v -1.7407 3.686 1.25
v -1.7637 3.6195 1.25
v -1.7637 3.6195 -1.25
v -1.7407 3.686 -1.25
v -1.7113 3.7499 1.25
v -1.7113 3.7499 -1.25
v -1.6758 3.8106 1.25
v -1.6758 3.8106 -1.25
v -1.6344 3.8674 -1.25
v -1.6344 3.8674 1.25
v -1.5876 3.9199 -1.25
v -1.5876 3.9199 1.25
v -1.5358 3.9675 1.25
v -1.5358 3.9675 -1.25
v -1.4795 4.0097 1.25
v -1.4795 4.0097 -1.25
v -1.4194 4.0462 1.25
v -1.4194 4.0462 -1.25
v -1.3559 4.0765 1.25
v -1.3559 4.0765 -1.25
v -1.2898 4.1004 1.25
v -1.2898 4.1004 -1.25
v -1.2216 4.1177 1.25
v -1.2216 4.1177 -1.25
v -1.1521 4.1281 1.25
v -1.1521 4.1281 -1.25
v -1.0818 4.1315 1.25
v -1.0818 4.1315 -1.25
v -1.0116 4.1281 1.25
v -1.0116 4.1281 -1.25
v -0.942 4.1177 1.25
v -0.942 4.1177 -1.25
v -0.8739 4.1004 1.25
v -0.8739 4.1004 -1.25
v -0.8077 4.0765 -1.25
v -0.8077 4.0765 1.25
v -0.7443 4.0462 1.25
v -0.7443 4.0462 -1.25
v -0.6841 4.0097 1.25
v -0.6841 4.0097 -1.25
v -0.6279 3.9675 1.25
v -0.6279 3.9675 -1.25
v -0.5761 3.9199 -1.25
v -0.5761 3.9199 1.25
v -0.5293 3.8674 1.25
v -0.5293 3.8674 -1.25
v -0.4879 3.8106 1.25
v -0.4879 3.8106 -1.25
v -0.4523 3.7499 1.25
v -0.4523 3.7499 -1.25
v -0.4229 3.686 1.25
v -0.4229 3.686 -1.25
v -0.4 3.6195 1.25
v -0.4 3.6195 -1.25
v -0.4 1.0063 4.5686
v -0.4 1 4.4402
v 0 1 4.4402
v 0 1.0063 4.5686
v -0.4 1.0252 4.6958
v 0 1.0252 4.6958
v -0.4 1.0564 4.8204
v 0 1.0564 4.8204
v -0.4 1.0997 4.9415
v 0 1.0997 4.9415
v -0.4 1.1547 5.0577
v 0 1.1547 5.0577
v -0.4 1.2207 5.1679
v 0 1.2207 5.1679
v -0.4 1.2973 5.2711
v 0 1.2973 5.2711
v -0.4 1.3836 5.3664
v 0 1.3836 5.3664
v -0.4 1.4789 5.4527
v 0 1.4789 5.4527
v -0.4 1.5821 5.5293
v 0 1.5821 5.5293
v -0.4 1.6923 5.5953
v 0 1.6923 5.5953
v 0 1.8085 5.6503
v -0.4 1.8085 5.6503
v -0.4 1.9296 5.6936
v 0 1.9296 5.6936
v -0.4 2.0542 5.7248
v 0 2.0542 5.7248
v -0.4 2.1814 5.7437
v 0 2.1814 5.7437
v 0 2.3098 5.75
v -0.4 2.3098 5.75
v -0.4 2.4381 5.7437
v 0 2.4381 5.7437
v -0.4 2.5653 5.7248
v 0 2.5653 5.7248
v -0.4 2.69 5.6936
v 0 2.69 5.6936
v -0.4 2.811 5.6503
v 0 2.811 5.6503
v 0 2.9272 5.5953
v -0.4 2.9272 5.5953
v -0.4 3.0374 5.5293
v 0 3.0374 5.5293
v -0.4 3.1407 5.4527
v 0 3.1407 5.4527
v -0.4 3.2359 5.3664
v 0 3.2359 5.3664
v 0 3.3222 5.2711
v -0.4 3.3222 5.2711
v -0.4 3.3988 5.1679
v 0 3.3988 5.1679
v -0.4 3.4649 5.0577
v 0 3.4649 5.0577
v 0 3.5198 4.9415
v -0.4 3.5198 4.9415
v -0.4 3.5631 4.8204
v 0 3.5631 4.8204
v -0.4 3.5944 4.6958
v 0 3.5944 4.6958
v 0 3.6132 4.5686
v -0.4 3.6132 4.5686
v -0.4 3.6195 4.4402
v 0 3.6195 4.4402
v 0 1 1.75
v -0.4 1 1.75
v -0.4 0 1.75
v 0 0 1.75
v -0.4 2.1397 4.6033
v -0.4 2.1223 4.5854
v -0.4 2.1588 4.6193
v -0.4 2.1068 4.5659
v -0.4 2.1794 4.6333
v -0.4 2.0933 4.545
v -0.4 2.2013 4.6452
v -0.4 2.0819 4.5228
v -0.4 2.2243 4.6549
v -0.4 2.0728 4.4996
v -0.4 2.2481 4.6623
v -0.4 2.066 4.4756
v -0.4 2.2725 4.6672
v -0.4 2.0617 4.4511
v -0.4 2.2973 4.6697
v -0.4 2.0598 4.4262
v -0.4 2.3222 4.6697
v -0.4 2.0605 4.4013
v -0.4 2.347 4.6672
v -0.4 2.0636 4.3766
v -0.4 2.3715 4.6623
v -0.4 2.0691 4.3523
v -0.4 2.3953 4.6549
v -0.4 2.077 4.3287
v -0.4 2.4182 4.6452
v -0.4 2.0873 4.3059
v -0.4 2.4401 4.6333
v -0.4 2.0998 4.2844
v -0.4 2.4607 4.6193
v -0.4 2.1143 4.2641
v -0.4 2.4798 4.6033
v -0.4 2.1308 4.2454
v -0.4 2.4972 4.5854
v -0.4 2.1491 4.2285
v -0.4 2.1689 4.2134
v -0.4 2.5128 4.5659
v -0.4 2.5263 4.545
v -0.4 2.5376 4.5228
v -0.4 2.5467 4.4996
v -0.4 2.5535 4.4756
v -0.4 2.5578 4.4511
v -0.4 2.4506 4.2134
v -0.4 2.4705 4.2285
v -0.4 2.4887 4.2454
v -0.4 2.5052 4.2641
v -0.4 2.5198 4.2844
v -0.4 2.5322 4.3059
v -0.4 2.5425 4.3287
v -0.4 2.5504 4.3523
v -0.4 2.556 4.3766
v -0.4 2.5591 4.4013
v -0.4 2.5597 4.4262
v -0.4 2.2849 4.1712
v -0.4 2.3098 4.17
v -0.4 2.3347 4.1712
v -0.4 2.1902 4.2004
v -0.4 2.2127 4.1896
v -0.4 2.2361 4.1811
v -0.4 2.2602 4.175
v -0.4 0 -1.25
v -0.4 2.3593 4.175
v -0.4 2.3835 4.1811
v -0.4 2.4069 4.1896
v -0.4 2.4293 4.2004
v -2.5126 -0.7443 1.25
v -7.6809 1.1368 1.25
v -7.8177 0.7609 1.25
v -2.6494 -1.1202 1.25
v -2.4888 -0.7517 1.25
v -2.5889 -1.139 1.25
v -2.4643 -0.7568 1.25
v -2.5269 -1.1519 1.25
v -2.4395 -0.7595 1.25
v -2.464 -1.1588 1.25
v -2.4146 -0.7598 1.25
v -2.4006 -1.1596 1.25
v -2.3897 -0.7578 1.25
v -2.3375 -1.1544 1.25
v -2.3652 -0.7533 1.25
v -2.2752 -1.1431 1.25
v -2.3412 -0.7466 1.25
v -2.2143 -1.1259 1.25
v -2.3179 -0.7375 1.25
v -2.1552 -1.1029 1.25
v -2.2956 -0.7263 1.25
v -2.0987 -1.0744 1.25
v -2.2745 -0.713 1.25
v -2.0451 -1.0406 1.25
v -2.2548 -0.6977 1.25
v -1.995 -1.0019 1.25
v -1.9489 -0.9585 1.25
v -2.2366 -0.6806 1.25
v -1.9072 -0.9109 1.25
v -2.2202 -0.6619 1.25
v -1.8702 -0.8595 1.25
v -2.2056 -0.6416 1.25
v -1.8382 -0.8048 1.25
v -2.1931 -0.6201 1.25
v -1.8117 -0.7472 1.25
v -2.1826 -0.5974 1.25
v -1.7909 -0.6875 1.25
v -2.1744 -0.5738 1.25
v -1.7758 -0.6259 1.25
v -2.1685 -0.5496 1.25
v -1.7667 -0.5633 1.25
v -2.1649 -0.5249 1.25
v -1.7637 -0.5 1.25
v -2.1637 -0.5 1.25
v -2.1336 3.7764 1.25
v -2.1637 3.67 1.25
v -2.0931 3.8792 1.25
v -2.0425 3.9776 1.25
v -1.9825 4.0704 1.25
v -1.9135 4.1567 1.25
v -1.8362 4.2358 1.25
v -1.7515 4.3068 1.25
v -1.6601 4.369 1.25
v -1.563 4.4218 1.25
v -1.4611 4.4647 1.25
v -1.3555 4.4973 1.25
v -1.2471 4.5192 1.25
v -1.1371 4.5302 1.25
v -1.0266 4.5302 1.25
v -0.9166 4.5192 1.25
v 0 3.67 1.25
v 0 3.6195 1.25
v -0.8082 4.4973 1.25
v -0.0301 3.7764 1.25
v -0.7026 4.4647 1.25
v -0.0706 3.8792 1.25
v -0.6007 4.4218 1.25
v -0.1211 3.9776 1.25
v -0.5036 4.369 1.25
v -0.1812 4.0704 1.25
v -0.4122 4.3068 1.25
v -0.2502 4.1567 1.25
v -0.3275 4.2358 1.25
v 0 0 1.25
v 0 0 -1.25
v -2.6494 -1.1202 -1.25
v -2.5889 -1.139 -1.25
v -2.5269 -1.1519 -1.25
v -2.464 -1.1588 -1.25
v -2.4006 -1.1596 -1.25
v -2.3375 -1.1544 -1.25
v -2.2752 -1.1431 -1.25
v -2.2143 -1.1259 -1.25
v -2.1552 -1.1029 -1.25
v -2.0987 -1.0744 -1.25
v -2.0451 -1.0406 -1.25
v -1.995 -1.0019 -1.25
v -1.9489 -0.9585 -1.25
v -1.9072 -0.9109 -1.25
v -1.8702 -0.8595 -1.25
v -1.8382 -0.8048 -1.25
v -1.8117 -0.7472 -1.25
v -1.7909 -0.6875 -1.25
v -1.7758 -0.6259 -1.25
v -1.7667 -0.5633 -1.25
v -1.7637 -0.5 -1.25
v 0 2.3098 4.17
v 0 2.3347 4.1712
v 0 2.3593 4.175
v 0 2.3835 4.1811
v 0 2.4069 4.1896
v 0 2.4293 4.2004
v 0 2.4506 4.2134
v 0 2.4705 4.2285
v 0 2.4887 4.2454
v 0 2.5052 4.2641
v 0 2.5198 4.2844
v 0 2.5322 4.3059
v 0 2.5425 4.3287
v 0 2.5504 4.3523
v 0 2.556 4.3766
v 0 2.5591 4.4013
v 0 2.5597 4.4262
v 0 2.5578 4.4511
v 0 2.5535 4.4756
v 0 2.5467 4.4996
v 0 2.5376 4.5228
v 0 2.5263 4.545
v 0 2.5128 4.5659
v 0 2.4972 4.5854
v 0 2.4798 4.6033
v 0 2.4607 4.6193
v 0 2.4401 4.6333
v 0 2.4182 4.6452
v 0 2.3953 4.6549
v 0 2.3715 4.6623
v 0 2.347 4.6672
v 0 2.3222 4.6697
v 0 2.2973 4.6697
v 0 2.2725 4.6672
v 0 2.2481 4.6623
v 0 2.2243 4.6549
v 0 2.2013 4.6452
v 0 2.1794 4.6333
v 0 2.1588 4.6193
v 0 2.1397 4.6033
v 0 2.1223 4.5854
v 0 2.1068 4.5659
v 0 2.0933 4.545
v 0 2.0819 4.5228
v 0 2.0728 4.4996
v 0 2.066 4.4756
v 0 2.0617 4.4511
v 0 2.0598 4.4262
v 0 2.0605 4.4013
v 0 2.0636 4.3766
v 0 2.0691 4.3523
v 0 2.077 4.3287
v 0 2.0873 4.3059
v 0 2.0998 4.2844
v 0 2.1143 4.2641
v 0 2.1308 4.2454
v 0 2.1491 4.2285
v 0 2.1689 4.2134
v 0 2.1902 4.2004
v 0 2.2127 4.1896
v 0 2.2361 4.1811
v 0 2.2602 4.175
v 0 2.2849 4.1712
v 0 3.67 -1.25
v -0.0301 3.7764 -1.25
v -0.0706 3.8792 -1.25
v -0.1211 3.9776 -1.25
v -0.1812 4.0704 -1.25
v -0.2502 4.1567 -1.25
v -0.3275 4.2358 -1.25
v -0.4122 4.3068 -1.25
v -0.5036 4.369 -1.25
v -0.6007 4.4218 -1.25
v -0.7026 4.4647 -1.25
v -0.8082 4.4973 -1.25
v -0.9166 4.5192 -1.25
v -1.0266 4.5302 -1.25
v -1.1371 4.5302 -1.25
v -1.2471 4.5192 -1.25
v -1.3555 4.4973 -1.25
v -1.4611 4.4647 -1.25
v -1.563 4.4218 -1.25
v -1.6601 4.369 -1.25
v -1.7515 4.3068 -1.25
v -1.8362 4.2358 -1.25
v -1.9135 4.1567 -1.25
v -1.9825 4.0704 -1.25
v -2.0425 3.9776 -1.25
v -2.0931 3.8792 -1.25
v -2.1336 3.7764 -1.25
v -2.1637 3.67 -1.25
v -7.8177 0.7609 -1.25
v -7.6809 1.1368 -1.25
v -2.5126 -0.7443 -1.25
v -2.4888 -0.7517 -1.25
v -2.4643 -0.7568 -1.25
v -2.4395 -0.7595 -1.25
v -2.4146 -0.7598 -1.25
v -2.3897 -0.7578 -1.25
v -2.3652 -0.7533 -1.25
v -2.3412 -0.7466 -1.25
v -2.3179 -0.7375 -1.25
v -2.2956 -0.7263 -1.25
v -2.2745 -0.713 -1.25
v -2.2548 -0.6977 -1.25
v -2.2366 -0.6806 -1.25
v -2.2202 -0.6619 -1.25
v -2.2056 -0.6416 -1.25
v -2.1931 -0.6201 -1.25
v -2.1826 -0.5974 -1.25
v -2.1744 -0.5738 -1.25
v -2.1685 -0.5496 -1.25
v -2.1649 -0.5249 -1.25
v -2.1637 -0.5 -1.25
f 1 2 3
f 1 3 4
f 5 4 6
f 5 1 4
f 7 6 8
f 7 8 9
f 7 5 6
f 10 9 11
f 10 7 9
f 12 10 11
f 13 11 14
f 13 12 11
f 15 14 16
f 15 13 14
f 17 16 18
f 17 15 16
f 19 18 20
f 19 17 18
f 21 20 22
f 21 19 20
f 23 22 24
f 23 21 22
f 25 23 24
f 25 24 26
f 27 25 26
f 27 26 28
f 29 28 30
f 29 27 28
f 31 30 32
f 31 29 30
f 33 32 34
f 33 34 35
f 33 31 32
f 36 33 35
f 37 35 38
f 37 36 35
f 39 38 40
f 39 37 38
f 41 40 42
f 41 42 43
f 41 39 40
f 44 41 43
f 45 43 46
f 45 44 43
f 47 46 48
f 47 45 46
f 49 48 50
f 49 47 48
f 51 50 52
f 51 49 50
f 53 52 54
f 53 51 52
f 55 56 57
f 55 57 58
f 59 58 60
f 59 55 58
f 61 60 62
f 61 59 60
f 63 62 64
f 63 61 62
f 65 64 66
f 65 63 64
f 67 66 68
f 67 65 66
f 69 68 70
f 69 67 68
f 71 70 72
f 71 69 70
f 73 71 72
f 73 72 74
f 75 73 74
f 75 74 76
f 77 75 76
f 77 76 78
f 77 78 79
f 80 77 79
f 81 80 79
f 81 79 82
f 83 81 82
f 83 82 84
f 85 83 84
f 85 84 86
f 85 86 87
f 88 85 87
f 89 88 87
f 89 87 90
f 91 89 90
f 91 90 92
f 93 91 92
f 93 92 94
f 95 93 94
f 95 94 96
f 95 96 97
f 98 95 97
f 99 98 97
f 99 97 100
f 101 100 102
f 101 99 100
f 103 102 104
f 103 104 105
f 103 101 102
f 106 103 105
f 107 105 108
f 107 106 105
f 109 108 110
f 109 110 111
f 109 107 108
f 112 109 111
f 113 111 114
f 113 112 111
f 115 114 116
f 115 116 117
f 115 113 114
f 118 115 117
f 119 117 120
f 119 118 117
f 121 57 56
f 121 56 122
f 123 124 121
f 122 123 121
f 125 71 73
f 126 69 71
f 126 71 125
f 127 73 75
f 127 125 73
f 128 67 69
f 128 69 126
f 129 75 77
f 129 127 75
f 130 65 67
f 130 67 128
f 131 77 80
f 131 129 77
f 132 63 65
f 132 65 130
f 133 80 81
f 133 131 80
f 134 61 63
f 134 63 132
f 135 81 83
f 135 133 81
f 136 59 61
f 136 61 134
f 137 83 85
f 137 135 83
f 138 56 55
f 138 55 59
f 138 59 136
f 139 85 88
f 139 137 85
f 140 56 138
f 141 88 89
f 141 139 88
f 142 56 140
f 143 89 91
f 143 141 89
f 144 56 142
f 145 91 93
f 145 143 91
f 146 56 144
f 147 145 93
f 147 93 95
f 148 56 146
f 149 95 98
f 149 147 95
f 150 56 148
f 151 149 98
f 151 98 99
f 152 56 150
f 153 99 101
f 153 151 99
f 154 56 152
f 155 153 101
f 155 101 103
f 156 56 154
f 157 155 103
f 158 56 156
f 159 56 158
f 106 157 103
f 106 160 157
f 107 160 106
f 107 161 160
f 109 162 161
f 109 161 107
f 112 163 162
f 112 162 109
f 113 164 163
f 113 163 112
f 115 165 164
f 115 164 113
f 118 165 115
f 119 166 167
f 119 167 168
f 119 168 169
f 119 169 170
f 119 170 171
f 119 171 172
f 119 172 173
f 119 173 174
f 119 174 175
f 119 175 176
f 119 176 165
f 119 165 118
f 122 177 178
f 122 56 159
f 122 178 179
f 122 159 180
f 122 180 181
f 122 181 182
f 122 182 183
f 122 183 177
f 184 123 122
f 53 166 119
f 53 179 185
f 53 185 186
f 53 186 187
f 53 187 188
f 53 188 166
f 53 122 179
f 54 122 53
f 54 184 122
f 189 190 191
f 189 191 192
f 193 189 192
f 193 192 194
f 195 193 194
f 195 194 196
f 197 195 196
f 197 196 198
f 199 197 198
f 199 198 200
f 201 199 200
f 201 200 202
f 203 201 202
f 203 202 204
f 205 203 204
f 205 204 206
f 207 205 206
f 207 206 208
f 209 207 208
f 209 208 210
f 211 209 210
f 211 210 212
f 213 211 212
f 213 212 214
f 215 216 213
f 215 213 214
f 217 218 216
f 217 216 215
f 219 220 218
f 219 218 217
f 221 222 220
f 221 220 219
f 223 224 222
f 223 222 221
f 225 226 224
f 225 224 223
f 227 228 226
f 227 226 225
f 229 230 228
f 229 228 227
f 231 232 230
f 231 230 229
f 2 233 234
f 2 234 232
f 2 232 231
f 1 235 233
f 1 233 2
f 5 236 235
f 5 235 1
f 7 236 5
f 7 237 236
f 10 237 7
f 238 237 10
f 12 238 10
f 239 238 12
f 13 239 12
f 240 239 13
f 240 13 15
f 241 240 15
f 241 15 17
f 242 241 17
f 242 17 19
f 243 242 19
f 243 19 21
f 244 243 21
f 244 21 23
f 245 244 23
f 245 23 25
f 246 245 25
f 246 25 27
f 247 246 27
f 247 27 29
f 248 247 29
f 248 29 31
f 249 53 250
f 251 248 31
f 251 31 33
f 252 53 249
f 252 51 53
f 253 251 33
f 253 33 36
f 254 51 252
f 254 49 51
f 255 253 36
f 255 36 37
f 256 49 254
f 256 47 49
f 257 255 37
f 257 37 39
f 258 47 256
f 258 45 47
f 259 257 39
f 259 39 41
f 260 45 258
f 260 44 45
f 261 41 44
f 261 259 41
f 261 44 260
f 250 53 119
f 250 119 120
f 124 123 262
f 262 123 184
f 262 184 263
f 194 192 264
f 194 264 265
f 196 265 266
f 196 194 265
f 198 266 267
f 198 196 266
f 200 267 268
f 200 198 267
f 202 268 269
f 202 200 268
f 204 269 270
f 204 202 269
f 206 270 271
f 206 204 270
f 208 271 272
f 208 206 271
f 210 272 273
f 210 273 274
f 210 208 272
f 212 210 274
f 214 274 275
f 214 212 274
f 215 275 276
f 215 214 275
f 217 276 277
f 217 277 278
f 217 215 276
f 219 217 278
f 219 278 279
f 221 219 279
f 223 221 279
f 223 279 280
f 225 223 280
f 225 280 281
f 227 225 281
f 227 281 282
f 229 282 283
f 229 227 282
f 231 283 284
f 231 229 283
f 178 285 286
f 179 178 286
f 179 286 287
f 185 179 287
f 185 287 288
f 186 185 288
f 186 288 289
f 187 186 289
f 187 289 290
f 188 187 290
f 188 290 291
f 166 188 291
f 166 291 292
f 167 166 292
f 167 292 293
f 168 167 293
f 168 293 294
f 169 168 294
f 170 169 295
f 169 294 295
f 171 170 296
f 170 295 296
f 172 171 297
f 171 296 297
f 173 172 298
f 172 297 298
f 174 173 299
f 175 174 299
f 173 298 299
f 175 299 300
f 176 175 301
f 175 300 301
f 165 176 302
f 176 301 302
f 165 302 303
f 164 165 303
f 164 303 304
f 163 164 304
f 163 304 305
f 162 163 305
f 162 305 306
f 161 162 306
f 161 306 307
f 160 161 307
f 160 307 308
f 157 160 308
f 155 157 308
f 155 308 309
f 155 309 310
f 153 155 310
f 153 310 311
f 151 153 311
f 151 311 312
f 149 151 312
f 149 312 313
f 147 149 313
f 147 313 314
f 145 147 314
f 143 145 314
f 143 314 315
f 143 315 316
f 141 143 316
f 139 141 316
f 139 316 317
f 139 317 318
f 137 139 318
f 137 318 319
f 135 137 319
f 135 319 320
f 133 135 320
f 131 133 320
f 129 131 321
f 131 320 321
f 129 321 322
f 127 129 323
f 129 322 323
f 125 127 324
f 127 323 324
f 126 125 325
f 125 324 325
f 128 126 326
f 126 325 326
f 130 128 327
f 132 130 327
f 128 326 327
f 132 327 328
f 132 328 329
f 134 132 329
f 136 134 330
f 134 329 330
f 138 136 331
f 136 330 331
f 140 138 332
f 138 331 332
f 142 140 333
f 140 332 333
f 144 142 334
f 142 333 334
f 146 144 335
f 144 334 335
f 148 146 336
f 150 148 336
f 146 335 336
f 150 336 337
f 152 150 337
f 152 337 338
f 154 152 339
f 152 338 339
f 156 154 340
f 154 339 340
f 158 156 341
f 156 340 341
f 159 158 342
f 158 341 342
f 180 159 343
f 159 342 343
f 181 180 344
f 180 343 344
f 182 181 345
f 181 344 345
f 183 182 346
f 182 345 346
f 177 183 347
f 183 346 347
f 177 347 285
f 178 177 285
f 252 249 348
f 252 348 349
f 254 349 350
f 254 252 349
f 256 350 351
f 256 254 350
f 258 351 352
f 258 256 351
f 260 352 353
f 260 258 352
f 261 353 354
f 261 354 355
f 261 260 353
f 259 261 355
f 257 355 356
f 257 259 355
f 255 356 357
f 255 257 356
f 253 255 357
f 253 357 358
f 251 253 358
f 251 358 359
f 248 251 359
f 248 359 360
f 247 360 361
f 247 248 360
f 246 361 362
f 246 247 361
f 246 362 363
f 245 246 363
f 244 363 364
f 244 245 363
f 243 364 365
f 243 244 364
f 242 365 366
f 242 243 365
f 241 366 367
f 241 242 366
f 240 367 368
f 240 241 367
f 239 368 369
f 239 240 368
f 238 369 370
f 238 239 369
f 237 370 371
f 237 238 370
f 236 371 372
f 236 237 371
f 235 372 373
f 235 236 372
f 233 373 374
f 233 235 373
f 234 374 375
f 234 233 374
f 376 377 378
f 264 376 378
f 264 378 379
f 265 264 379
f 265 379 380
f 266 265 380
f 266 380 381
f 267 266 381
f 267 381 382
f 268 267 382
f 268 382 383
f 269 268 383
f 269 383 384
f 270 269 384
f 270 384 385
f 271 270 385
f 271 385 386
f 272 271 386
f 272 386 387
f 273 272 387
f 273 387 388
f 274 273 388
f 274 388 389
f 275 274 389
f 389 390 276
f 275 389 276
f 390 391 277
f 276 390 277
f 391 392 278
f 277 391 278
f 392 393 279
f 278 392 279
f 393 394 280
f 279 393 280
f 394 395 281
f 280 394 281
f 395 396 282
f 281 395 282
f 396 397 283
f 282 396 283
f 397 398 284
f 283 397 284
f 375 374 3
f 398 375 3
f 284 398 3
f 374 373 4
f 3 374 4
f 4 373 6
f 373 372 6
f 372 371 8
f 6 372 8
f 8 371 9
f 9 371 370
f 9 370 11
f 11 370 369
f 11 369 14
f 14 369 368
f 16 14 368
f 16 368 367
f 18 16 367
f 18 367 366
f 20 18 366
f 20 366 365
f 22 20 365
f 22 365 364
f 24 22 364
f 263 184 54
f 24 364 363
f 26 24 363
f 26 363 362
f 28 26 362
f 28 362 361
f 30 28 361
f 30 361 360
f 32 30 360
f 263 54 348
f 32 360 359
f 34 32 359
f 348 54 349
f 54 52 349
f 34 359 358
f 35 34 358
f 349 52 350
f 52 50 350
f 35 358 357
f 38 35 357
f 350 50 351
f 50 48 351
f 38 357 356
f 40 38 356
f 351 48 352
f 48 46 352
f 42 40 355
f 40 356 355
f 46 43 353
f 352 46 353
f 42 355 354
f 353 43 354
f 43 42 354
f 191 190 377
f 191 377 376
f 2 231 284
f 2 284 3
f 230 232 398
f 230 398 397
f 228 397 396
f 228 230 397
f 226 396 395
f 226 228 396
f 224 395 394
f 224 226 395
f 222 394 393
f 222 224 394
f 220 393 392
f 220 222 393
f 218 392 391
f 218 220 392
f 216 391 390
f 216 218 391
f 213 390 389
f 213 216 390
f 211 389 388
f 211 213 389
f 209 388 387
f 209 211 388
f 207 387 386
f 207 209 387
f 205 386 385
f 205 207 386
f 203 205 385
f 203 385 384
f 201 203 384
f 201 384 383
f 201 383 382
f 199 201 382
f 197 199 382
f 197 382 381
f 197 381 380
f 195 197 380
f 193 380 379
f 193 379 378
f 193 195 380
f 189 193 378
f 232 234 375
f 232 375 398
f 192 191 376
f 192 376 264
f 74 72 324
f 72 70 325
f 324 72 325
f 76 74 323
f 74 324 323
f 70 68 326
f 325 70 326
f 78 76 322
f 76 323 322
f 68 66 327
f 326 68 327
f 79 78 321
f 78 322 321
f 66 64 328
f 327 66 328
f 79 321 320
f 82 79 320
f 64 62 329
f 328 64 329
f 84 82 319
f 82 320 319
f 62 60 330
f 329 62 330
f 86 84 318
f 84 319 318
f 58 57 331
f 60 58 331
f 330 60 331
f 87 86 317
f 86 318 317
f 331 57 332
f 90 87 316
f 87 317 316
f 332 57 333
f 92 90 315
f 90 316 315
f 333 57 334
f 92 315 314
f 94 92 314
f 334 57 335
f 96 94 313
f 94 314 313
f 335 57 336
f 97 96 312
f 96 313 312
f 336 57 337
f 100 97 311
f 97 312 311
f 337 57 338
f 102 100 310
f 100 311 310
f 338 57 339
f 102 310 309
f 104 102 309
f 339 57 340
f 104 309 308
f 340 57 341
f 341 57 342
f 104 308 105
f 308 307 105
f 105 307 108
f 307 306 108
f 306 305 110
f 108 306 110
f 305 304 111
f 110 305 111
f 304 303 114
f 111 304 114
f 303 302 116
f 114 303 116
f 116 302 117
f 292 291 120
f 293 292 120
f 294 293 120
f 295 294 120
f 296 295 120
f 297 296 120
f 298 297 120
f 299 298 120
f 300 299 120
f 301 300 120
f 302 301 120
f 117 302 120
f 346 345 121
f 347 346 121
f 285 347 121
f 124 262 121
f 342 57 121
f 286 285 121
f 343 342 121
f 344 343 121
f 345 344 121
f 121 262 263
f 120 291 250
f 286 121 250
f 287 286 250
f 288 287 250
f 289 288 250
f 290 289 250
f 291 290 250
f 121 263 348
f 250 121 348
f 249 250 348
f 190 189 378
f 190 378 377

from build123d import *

# Parameters (mm, degrees)
BOSS_EXTRUDE1_DEPTH = 1.25
SKETCH2_W           = 0.4
SKETCH2_H           = 3.619533261
BOSS_EXTRUDE2_DEPTH = 4.5
SKETCH3_W           = 4
SKETCH3_H           = 1
CUT_EXTRUDE1_DEPTH  = 4.5
SKETCH4_R           = 0.25
CUT_EXTRUDE2_DEPTH  = 4.5
FILLET1_RADIUS      = 1.309766631
FILLET1_LENGTH      = 0.4


with BuildPart() as part:
    # Sketch1 → Boss-Extrude1 (new, symmetric)
    with BuildSketch(Plane.XY):
        with BuildLine():
            Line((0, 0), (0, 3.67))
            ThreePointArc((0, 3.67), (-1.08183729, 4.531548642), (-2.163674581, 3.67))
            Line((-2.163674581, 3.67), (-2.163674581, -0.5))
            ThreePointArc((-2.163674581, -0.5), (-2.274544707, -0.712979532), (-2.512599818, -0.744320081))
            Line((-2.512599818, -0.744320081), (-7.680909232, 1.136790707))
            Line((-7.680909232, 1.136790707), (-7.817717289, 0.760913659))
            Line((-7.817717289, 0.760913659), (-2.649407875, -1.12019713))
            ThreePointArc((-2.649407875, -1.12019713), (-2.045114133, -1.040640349), (-1.763674581, -0.5))
            Line((-1.763674581, -0.5), (-1.763674581, 3.619533261))
            ThreePointArc((-1.763674581, 3.619533261), (-1.08183729, 4.131548642), (-0.4, 3.619533261))
            Line((-0.4, 3.619533261), (-0.4, 0))
            Line((-0.4, 0), (0, 0))
        make_face()
    extrude(amount=BOSS_EXTRUDE1_DEPTH, both=True)

    # Sketch2 → Boss-Extrude2 (add)
    with BuildSketch(Plane.XY.offset(1.25)):
        with Locations((-0.2, 1.809766631)):
            Rectangle(SKETCH2_W, SKETCH2_H)
    extrude(amount=BOSS_EXTRUDE2_DEPTH)

    # Sketch3 → Cut-Extrude1 (cut)
    with BuildSketch(Plane(origin=(0, 0, 0), x_dir=(0, 0, -1), z_dir=(1, 0, 0))):
        with Locations((-3.75, 0.5)):
            Rectangle(SKETCH3_W, SKETCH3_H)
    extrude(amount=-CUT_EXTRUDE1_DEPTH, mode=Mode.SUBTRACT)

    # Sketch4 → Cut-Extrude2 (cut)
    with BuildSketch(Plane(origin=(0, 0, 0), x_dir=(0, 0, -1), z_dir=(1, 0, 0))):
        with Locations((-4.42, 2.309766631)):
            Circle(SKETCH4_R)
    extrude(amount=-CUT_EXTRUDE2_DEPTH, mode=Mode.SUBTRACT)

    # Fillet1: full round fillet: the end face becomes a half cylinder, R = half its width
    fillet1_face = Plane((-0.2, 2.309766631, 5.75), x_dir=(-1, 0, 0), z_dir=(0, 0, 1))  # on the end face: x along it, z out of the body
    fillet1_slab = fillet1_face.offset(-FILLET1_RADIUS / 2) * Box(FILLET1_LENGTH, 2 * FILLET1_RADIUS, FILLET1_RADIUS, mode=Mode.PRIVATE)  # the body's end, R deep
    fillet1_round = Plane((-0.2, 2.309766631, 4.440233369), x_dir=(0, 0, 1), z_dir=(-1, 0, 0)) * Cylinder(FILLET1_RADIUS, FILLET1_LENGTH, mode=Mode.PRIVATE)  # its axis R under the face
    add(fillet1_slab - fillet1_round, mode=Mode.SUBTRACT)


solid = part.part
